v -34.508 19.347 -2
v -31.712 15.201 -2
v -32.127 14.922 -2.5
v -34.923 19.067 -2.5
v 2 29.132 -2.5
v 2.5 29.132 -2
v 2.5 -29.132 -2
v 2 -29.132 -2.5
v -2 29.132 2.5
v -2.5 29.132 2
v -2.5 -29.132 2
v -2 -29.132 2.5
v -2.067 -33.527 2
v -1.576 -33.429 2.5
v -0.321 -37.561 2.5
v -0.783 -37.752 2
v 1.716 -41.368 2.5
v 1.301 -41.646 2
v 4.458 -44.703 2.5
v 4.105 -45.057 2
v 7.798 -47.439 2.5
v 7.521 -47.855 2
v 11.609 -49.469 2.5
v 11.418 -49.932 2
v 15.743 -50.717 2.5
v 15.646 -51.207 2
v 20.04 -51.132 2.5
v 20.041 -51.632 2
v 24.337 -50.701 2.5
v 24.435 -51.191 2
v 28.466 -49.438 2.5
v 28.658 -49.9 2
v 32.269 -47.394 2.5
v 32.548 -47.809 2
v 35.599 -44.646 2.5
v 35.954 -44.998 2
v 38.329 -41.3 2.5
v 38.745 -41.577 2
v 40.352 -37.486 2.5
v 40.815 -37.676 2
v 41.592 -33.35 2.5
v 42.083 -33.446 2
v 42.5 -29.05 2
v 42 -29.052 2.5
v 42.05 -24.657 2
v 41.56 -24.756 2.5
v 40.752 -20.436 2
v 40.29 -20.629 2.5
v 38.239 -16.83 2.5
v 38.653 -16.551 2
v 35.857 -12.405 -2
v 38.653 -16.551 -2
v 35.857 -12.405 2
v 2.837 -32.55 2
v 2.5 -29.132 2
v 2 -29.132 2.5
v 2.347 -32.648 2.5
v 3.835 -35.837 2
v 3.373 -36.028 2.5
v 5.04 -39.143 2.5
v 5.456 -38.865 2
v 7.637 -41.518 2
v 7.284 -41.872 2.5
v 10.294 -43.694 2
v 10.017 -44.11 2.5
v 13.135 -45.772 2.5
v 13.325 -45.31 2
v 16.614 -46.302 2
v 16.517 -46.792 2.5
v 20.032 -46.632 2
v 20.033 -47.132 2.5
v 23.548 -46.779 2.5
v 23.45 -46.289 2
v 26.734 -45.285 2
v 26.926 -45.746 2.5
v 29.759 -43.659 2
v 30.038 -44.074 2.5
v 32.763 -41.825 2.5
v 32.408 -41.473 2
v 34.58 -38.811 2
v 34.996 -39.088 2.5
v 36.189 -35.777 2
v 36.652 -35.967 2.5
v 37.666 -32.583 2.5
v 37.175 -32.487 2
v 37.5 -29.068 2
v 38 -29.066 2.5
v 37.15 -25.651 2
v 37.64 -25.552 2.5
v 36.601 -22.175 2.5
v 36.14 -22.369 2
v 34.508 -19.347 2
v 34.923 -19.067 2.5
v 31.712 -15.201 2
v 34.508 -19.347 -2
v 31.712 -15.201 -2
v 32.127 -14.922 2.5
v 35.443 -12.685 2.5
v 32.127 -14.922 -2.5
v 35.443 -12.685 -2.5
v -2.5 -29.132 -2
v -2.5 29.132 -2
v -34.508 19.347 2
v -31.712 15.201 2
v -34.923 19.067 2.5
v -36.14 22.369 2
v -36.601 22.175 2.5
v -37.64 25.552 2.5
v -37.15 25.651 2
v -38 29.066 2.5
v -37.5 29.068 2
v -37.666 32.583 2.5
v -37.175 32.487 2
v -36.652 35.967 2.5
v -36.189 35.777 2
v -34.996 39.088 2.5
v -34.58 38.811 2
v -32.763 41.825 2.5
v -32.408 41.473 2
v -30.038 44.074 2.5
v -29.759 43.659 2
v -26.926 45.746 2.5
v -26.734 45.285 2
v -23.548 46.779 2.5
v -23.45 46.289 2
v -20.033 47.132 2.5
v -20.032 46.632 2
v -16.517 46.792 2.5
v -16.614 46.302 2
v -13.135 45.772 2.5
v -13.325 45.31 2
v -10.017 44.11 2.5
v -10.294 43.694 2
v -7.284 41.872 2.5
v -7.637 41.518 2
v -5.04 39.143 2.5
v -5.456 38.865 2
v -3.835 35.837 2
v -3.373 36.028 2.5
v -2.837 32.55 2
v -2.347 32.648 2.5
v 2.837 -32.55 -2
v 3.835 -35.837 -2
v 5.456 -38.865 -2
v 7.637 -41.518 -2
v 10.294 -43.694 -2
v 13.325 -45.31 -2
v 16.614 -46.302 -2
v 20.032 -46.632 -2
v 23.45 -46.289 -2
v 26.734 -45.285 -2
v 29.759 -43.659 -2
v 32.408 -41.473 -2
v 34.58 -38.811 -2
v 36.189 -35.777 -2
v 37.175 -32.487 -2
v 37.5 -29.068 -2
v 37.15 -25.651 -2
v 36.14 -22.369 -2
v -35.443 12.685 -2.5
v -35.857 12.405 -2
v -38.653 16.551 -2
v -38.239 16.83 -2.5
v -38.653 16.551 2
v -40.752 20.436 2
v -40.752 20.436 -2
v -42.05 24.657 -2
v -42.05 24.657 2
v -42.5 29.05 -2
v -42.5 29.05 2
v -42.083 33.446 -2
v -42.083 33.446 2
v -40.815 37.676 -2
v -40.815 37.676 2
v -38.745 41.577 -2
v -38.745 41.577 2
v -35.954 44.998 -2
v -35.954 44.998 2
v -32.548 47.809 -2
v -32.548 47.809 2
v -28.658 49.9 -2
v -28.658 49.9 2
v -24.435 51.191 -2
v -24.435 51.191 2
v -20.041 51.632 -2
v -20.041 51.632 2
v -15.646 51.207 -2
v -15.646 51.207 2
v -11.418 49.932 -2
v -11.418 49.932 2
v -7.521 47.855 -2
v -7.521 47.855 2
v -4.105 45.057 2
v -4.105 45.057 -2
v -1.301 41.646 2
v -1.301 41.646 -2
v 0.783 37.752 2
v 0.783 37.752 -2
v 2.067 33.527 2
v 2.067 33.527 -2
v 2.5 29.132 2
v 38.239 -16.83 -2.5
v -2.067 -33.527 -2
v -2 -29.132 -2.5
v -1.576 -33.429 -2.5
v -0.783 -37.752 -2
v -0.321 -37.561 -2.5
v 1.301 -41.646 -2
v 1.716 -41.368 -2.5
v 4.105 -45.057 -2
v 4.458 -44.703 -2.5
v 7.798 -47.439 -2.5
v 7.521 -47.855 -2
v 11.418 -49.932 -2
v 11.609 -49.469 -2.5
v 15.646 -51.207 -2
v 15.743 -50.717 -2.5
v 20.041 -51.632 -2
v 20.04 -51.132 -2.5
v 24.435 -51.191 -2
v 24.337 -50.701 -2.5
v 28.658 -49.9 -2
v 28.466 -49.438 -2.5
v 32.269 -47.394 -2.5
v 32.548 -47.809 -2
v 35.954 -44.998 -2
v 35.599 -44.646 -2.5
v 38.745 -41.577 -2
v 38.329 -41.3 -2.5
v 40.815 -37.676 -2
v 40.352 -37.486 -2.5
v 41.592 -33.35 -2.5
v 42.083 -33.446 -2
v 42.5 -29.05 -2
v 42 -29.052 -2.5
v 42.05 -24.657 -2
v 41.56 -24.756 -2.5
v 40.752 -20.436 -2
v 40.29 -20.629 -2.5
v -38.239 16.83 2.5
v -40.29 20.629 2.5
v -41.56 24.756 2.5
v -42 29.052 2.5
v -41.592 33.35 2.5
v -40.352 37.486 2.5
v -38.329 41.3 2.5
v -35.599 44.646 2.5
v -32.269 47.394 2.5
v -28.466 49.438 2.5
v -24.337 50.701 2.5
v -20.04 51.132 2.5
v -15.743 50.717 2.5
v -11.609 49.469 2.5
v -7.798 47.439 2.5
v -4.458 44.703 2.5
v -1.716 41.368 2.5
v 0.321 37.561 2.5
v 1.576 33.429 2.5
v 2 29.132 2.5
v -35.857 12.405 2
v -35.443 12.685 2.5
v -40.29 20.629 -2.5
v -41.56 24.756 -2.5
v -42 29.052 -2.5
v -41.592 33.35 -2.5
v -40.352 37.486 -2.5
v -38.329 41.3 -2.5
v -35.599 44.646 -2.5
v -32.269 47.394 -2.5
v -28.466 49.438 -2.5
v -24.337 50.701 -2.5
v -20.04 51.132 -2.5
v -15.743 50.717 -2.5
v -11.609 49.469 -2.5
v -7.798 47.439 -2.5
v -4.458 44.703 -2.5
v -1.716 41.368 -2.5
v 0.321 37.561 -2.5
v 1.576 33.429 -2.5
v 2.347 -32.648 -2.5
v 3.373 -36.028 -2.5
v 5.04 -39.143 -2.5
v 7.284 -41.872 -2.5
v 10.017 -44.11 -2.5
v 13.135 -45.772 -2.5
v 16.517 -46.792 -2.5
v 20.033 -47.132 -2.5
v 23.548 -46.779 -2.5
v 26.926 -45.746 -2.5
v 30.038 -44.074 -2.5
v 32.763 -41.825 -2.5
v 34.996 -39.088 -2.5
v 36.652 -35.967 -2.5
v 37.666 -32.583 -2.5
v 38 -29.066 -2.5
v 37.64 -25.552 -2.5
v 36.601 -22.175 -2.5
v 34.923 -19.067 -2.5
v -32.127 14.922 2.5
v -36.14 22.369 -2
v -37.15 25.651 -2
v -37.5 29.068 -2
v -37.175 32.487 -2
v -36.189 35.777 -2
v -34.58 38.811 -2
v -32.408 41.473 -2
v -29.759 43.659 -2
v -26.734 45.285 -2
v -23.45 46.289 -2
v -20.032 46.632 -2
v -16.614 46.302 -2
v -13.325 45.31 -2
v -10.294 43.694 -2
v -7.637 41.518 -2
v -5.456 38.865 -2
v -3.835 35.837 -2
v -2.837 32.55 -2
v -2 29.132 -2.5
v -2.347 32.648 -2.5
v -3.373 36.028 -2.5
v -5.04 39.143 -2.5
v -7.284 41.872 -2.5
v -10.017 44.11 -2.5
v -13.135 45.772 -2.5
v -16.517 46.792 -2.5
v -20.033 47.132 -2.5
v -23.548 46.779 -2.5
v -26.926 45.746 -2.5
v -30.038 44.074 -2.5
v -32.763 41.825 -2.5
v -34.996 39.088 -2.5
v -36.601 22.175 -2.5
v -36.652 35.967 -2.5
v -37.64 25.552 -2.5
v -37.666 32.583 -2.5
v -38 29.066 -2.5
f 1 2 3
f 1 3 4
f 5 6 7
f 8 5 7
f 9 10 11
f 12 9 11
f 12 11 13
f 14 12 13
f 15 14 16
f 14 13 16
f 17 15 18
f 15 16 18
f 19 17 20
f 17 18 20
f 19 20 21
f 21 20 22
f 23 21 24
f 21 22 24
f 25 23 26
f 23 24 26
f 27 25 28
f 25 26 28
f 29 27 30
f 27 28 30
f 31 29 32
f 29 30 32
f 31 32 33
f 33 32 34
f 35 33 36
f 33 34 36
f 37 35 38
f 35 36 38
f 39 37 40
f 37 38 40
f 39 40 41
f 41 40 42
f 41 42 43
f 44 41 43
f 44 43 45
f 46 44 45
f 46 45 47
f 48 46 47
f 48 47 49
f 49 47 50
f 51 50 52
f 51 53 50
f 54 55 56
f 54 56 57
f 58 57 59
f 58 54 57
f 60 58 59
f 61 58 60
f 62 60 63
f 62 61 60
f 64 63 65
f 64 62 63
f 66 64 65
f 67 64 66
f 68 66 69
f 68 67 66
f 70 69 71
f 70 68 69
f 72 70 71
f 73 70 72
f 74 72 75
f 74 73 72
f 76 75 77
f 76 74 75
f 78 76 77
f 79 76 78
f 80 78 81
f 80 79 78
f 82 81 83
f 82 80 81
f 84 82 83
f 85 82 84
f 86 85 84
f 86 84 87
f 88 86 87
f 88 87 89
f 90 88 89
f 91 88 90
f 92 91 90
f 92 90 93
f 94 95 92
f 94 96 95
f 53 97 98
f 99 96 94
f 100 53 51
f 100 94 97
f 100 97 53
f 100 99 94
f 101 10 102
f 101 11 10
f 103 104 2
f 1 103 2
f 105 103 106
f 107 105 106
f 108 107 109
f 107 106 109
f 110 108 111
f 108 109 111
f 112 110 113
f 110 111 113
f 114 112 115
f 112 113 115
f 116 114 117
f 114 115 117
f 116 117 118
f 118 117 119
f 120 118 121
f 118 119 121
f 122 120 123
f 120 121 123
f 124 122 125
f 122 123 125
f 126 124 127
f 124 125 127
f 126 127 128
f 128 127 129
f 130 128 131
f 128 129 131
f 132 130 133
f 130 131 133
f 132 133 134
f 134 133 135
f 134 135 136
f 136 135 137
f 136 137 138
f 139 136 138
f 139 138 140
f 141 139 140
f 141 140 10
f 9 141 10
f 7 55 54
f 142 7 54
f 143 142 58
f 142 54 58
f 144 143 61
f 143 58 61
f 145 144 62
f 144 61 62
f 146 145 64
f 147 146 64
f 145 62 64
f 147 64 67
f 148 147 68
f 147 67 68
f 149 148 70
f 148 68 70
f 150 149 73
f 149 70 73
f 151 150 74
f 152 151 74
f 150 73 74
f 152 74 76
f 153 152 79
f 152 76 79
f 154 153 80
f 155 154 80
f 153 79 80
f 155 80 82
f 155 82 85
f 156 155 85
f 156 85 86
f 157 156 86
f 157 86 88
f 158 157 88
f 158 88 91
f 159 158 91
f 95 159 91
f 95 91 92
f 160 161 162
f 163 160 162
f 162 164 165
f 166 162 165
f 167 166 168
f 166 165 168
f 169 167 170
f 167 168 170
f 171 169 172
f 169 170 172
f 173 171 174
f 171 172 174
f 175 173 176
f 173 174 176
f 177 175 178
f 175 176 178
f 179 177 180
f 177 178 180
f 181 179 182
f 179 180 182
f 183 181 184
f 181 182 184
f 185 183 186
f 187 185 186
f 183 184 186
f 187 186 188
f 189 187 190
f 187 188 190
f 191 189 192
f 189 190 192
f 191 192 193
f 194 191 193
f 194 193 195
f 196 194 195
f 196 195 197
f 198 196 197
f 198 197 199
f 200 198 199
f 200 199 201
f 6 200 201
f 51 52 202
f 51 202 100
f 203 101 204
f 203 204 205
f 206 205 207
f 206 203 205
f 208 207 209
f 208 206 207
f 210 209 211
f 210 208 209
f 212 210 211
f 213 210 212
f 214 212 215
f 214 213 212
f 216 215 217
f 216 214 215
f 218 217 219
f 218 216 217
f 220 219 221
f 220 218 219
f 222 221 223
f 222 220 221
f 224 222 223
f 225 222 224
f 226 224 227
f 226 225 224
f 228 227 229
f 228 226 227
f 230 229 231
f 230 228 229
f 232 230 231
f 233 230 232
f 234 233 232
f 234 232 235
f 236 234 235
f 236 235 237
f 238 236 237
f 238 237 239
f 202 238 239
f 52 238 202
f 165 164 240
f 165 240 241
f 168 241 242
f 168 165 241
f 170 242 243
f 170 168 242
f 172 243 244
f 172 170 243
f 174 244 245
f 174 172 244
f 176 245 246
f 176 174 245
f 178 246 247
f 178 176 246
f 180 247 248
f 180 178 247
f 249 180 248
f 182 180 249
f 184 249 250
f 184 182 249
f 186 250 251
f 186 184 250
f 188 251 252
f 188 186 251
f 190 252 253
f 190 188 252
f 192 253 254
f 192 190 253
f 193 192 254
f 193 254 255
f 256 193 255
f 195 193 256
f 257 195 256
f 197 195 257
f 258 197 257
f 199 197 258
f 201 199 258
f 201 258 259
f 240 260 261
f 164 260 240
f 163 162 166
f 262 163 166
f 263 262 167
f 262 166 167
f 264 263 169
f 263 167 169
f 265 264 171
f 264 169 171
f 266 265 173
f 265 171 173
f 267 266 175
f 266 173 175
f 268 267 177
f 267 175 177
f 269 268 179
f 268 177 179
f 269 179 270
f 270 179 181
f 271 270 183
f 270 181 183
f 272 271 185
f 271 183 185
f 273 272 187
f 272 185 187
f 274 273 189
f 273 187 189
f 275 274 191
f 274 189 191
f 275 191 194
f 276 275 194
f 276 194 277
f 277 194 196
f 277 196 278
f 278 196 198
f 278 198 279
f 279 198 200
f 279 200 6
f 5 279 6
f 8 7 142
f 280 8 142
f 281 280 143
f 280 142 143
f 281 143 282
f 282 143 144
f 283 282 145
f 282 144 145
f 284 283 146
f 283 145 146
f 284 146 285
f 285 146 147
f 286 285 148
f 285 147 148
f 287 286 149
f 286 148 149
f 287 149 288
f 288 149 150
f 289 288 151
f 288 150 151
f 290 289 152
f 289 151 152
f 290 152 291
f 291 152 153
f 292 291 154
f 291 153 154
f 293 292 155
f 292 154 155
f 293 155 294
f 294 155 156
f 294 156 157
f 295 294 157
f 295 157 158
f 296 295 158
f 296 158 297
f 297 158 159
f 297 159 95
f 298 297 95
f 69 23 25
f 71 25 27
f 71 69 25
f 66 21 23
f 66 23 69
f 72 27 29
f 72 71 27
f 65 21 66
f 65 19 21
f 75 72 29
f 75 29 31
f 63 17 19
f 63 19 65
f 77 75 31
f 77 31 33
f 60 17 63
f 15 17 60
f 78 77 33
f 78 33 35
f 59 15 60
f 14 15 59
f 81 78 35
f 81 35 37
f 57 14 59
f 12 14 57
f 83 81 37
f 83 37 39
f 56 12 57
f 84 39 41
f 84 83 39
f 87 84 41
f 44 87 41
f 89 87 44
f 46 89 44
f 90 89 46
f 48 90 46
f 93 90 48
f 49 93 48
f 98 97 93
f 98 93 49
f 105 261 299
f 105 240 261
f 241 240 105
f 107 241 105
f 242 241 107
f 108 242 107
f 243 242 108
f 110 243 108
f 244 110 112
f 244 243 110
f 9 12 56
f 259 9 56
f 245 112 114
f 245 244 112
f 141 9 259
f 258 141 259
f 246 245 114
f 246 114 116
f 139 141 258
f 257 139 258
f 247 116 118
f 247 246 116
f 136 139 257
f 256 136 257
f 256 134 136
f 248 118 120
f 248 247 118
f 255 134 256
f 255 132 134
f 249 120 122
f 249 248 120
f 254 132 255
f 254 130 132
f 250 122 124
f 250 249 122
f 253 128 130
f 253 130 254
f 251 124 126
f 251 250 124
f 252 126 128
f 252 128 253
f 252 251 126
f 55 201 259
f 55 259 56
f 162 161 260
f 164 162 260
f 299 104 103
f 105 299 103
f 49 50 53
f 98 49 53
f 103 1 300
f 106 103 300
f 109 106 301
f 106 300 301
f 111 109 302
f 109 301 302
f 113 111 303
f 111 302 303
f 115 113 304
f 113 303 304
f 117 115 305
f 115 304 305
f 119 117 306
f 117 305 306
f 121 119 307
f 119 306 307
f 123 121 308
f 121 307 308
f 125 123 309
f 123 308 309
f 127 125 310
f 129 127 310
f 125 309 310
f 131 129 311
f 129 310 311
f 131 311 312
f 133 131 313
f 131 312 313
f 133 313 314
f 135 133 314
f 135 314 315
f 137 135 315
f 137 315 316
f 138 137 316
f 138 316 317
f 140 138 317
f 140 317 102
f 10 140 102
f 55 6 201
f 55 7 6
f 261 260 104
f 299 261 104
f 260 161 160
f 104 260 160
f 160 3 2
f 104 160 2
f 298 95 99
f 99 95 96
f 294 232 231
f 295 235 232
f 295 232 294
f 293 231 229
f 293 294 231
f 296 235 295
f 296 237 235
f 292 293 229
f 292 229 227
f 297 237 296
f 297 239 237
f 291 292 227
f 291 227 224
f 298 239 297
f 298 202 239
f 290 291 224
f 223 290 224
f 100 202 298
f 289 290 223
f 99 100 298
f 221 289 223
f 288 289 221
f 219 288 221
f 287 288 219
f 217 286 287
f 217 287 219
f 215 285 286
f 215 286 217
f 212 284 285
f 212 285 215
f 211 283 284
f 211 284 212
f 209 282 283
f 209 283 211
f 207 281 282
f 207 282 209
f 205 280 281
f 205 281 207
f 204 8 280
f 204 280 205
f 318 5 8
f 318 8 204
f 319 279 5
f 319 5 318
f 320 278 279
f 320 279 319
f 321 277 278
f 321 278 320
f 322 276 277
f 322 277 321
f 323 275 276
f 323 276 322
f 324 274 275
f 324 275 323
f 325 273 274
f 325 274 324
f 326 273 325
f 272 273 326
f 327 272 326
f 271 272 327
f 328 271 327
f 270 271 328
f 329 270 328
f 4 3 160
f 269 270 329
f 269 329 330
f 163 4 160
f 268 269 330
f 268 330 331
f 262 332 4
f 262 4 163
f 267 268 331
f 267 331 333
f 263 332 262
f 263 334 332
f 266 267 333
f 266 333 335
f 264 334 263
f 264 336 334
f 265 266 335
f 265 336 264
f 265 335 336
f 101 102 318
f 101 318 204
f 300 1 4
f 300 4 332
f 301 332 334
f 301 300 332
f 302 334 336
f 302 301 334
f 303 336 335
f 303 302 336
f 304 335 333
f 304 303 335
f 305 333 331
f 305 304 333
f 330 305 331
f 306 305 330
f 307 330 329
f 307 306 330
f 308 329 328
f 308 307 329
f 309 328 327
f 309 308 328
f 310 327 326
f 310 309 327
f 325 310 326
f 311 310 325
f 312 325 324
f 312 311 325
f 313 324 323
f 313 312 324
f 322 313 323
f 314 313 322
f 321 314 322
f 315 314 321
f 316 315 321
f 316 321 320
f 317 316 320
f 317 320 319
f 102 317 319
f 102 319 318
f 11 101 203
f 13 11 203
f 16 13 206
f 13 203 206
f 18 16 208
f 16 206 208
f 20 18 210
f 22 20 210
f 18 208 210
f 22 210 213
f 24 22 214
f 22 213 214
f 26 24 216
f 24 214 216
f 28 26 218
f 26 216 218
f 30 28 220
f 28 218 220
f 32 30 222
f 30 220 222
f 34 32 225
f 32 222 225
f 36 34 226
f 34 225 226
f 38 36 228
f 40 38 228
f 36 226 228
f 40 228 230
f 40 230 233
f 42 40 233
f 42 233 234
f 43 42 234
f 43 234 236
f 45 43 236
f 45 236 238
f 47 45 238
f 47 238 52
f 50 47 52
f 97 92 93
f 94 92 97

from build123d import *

# Parameters (mm, degrees)
F1_W    = 5
F1_H    = 5
F3_SIZE = 0.5


with BuildPart() as f2:
    # F2: sweep along a path in F0
    with BuildLine(Plane.XY) as f2_path:
        Line((-33.7847869337, 13.8033740678), (-36.5807514511, 17.9485619306))
        ThreePointArc((-36.5807514511, 17.9485619306), (-25.8474340945, 48.2585151193), (0, 29.13242))
        Line((0, 29.13242), (0, -29.13242))
        ThreePointArc((0, -29.13242), (25.8474340945, -48.2585151193), (36.5807514511, -17.9485619306))
        Line((36.5807514511, -17.9485619306), (33.7847869337, -13.8033740678))
    # F1 (on Front) → F2 (sweep)
    with BuildSketch(Plane.XZ):
        Rectangle(F1_W, F1_H)
    sweep(path=f2_path.line)

    # F3
    f3_edges = [f2.edges().sort_by_distance(p)[0] for p in [
        (-2.5, 0, -2.5),
        (-26.578363, 50.649277, -2.5),
        (-26.578363, 50.649277, 2.5),
        (-2.5, 0, 2.5),
    ]]
    chamfer(f3_edges, length=F3_SIZE)


solid = f2.part
